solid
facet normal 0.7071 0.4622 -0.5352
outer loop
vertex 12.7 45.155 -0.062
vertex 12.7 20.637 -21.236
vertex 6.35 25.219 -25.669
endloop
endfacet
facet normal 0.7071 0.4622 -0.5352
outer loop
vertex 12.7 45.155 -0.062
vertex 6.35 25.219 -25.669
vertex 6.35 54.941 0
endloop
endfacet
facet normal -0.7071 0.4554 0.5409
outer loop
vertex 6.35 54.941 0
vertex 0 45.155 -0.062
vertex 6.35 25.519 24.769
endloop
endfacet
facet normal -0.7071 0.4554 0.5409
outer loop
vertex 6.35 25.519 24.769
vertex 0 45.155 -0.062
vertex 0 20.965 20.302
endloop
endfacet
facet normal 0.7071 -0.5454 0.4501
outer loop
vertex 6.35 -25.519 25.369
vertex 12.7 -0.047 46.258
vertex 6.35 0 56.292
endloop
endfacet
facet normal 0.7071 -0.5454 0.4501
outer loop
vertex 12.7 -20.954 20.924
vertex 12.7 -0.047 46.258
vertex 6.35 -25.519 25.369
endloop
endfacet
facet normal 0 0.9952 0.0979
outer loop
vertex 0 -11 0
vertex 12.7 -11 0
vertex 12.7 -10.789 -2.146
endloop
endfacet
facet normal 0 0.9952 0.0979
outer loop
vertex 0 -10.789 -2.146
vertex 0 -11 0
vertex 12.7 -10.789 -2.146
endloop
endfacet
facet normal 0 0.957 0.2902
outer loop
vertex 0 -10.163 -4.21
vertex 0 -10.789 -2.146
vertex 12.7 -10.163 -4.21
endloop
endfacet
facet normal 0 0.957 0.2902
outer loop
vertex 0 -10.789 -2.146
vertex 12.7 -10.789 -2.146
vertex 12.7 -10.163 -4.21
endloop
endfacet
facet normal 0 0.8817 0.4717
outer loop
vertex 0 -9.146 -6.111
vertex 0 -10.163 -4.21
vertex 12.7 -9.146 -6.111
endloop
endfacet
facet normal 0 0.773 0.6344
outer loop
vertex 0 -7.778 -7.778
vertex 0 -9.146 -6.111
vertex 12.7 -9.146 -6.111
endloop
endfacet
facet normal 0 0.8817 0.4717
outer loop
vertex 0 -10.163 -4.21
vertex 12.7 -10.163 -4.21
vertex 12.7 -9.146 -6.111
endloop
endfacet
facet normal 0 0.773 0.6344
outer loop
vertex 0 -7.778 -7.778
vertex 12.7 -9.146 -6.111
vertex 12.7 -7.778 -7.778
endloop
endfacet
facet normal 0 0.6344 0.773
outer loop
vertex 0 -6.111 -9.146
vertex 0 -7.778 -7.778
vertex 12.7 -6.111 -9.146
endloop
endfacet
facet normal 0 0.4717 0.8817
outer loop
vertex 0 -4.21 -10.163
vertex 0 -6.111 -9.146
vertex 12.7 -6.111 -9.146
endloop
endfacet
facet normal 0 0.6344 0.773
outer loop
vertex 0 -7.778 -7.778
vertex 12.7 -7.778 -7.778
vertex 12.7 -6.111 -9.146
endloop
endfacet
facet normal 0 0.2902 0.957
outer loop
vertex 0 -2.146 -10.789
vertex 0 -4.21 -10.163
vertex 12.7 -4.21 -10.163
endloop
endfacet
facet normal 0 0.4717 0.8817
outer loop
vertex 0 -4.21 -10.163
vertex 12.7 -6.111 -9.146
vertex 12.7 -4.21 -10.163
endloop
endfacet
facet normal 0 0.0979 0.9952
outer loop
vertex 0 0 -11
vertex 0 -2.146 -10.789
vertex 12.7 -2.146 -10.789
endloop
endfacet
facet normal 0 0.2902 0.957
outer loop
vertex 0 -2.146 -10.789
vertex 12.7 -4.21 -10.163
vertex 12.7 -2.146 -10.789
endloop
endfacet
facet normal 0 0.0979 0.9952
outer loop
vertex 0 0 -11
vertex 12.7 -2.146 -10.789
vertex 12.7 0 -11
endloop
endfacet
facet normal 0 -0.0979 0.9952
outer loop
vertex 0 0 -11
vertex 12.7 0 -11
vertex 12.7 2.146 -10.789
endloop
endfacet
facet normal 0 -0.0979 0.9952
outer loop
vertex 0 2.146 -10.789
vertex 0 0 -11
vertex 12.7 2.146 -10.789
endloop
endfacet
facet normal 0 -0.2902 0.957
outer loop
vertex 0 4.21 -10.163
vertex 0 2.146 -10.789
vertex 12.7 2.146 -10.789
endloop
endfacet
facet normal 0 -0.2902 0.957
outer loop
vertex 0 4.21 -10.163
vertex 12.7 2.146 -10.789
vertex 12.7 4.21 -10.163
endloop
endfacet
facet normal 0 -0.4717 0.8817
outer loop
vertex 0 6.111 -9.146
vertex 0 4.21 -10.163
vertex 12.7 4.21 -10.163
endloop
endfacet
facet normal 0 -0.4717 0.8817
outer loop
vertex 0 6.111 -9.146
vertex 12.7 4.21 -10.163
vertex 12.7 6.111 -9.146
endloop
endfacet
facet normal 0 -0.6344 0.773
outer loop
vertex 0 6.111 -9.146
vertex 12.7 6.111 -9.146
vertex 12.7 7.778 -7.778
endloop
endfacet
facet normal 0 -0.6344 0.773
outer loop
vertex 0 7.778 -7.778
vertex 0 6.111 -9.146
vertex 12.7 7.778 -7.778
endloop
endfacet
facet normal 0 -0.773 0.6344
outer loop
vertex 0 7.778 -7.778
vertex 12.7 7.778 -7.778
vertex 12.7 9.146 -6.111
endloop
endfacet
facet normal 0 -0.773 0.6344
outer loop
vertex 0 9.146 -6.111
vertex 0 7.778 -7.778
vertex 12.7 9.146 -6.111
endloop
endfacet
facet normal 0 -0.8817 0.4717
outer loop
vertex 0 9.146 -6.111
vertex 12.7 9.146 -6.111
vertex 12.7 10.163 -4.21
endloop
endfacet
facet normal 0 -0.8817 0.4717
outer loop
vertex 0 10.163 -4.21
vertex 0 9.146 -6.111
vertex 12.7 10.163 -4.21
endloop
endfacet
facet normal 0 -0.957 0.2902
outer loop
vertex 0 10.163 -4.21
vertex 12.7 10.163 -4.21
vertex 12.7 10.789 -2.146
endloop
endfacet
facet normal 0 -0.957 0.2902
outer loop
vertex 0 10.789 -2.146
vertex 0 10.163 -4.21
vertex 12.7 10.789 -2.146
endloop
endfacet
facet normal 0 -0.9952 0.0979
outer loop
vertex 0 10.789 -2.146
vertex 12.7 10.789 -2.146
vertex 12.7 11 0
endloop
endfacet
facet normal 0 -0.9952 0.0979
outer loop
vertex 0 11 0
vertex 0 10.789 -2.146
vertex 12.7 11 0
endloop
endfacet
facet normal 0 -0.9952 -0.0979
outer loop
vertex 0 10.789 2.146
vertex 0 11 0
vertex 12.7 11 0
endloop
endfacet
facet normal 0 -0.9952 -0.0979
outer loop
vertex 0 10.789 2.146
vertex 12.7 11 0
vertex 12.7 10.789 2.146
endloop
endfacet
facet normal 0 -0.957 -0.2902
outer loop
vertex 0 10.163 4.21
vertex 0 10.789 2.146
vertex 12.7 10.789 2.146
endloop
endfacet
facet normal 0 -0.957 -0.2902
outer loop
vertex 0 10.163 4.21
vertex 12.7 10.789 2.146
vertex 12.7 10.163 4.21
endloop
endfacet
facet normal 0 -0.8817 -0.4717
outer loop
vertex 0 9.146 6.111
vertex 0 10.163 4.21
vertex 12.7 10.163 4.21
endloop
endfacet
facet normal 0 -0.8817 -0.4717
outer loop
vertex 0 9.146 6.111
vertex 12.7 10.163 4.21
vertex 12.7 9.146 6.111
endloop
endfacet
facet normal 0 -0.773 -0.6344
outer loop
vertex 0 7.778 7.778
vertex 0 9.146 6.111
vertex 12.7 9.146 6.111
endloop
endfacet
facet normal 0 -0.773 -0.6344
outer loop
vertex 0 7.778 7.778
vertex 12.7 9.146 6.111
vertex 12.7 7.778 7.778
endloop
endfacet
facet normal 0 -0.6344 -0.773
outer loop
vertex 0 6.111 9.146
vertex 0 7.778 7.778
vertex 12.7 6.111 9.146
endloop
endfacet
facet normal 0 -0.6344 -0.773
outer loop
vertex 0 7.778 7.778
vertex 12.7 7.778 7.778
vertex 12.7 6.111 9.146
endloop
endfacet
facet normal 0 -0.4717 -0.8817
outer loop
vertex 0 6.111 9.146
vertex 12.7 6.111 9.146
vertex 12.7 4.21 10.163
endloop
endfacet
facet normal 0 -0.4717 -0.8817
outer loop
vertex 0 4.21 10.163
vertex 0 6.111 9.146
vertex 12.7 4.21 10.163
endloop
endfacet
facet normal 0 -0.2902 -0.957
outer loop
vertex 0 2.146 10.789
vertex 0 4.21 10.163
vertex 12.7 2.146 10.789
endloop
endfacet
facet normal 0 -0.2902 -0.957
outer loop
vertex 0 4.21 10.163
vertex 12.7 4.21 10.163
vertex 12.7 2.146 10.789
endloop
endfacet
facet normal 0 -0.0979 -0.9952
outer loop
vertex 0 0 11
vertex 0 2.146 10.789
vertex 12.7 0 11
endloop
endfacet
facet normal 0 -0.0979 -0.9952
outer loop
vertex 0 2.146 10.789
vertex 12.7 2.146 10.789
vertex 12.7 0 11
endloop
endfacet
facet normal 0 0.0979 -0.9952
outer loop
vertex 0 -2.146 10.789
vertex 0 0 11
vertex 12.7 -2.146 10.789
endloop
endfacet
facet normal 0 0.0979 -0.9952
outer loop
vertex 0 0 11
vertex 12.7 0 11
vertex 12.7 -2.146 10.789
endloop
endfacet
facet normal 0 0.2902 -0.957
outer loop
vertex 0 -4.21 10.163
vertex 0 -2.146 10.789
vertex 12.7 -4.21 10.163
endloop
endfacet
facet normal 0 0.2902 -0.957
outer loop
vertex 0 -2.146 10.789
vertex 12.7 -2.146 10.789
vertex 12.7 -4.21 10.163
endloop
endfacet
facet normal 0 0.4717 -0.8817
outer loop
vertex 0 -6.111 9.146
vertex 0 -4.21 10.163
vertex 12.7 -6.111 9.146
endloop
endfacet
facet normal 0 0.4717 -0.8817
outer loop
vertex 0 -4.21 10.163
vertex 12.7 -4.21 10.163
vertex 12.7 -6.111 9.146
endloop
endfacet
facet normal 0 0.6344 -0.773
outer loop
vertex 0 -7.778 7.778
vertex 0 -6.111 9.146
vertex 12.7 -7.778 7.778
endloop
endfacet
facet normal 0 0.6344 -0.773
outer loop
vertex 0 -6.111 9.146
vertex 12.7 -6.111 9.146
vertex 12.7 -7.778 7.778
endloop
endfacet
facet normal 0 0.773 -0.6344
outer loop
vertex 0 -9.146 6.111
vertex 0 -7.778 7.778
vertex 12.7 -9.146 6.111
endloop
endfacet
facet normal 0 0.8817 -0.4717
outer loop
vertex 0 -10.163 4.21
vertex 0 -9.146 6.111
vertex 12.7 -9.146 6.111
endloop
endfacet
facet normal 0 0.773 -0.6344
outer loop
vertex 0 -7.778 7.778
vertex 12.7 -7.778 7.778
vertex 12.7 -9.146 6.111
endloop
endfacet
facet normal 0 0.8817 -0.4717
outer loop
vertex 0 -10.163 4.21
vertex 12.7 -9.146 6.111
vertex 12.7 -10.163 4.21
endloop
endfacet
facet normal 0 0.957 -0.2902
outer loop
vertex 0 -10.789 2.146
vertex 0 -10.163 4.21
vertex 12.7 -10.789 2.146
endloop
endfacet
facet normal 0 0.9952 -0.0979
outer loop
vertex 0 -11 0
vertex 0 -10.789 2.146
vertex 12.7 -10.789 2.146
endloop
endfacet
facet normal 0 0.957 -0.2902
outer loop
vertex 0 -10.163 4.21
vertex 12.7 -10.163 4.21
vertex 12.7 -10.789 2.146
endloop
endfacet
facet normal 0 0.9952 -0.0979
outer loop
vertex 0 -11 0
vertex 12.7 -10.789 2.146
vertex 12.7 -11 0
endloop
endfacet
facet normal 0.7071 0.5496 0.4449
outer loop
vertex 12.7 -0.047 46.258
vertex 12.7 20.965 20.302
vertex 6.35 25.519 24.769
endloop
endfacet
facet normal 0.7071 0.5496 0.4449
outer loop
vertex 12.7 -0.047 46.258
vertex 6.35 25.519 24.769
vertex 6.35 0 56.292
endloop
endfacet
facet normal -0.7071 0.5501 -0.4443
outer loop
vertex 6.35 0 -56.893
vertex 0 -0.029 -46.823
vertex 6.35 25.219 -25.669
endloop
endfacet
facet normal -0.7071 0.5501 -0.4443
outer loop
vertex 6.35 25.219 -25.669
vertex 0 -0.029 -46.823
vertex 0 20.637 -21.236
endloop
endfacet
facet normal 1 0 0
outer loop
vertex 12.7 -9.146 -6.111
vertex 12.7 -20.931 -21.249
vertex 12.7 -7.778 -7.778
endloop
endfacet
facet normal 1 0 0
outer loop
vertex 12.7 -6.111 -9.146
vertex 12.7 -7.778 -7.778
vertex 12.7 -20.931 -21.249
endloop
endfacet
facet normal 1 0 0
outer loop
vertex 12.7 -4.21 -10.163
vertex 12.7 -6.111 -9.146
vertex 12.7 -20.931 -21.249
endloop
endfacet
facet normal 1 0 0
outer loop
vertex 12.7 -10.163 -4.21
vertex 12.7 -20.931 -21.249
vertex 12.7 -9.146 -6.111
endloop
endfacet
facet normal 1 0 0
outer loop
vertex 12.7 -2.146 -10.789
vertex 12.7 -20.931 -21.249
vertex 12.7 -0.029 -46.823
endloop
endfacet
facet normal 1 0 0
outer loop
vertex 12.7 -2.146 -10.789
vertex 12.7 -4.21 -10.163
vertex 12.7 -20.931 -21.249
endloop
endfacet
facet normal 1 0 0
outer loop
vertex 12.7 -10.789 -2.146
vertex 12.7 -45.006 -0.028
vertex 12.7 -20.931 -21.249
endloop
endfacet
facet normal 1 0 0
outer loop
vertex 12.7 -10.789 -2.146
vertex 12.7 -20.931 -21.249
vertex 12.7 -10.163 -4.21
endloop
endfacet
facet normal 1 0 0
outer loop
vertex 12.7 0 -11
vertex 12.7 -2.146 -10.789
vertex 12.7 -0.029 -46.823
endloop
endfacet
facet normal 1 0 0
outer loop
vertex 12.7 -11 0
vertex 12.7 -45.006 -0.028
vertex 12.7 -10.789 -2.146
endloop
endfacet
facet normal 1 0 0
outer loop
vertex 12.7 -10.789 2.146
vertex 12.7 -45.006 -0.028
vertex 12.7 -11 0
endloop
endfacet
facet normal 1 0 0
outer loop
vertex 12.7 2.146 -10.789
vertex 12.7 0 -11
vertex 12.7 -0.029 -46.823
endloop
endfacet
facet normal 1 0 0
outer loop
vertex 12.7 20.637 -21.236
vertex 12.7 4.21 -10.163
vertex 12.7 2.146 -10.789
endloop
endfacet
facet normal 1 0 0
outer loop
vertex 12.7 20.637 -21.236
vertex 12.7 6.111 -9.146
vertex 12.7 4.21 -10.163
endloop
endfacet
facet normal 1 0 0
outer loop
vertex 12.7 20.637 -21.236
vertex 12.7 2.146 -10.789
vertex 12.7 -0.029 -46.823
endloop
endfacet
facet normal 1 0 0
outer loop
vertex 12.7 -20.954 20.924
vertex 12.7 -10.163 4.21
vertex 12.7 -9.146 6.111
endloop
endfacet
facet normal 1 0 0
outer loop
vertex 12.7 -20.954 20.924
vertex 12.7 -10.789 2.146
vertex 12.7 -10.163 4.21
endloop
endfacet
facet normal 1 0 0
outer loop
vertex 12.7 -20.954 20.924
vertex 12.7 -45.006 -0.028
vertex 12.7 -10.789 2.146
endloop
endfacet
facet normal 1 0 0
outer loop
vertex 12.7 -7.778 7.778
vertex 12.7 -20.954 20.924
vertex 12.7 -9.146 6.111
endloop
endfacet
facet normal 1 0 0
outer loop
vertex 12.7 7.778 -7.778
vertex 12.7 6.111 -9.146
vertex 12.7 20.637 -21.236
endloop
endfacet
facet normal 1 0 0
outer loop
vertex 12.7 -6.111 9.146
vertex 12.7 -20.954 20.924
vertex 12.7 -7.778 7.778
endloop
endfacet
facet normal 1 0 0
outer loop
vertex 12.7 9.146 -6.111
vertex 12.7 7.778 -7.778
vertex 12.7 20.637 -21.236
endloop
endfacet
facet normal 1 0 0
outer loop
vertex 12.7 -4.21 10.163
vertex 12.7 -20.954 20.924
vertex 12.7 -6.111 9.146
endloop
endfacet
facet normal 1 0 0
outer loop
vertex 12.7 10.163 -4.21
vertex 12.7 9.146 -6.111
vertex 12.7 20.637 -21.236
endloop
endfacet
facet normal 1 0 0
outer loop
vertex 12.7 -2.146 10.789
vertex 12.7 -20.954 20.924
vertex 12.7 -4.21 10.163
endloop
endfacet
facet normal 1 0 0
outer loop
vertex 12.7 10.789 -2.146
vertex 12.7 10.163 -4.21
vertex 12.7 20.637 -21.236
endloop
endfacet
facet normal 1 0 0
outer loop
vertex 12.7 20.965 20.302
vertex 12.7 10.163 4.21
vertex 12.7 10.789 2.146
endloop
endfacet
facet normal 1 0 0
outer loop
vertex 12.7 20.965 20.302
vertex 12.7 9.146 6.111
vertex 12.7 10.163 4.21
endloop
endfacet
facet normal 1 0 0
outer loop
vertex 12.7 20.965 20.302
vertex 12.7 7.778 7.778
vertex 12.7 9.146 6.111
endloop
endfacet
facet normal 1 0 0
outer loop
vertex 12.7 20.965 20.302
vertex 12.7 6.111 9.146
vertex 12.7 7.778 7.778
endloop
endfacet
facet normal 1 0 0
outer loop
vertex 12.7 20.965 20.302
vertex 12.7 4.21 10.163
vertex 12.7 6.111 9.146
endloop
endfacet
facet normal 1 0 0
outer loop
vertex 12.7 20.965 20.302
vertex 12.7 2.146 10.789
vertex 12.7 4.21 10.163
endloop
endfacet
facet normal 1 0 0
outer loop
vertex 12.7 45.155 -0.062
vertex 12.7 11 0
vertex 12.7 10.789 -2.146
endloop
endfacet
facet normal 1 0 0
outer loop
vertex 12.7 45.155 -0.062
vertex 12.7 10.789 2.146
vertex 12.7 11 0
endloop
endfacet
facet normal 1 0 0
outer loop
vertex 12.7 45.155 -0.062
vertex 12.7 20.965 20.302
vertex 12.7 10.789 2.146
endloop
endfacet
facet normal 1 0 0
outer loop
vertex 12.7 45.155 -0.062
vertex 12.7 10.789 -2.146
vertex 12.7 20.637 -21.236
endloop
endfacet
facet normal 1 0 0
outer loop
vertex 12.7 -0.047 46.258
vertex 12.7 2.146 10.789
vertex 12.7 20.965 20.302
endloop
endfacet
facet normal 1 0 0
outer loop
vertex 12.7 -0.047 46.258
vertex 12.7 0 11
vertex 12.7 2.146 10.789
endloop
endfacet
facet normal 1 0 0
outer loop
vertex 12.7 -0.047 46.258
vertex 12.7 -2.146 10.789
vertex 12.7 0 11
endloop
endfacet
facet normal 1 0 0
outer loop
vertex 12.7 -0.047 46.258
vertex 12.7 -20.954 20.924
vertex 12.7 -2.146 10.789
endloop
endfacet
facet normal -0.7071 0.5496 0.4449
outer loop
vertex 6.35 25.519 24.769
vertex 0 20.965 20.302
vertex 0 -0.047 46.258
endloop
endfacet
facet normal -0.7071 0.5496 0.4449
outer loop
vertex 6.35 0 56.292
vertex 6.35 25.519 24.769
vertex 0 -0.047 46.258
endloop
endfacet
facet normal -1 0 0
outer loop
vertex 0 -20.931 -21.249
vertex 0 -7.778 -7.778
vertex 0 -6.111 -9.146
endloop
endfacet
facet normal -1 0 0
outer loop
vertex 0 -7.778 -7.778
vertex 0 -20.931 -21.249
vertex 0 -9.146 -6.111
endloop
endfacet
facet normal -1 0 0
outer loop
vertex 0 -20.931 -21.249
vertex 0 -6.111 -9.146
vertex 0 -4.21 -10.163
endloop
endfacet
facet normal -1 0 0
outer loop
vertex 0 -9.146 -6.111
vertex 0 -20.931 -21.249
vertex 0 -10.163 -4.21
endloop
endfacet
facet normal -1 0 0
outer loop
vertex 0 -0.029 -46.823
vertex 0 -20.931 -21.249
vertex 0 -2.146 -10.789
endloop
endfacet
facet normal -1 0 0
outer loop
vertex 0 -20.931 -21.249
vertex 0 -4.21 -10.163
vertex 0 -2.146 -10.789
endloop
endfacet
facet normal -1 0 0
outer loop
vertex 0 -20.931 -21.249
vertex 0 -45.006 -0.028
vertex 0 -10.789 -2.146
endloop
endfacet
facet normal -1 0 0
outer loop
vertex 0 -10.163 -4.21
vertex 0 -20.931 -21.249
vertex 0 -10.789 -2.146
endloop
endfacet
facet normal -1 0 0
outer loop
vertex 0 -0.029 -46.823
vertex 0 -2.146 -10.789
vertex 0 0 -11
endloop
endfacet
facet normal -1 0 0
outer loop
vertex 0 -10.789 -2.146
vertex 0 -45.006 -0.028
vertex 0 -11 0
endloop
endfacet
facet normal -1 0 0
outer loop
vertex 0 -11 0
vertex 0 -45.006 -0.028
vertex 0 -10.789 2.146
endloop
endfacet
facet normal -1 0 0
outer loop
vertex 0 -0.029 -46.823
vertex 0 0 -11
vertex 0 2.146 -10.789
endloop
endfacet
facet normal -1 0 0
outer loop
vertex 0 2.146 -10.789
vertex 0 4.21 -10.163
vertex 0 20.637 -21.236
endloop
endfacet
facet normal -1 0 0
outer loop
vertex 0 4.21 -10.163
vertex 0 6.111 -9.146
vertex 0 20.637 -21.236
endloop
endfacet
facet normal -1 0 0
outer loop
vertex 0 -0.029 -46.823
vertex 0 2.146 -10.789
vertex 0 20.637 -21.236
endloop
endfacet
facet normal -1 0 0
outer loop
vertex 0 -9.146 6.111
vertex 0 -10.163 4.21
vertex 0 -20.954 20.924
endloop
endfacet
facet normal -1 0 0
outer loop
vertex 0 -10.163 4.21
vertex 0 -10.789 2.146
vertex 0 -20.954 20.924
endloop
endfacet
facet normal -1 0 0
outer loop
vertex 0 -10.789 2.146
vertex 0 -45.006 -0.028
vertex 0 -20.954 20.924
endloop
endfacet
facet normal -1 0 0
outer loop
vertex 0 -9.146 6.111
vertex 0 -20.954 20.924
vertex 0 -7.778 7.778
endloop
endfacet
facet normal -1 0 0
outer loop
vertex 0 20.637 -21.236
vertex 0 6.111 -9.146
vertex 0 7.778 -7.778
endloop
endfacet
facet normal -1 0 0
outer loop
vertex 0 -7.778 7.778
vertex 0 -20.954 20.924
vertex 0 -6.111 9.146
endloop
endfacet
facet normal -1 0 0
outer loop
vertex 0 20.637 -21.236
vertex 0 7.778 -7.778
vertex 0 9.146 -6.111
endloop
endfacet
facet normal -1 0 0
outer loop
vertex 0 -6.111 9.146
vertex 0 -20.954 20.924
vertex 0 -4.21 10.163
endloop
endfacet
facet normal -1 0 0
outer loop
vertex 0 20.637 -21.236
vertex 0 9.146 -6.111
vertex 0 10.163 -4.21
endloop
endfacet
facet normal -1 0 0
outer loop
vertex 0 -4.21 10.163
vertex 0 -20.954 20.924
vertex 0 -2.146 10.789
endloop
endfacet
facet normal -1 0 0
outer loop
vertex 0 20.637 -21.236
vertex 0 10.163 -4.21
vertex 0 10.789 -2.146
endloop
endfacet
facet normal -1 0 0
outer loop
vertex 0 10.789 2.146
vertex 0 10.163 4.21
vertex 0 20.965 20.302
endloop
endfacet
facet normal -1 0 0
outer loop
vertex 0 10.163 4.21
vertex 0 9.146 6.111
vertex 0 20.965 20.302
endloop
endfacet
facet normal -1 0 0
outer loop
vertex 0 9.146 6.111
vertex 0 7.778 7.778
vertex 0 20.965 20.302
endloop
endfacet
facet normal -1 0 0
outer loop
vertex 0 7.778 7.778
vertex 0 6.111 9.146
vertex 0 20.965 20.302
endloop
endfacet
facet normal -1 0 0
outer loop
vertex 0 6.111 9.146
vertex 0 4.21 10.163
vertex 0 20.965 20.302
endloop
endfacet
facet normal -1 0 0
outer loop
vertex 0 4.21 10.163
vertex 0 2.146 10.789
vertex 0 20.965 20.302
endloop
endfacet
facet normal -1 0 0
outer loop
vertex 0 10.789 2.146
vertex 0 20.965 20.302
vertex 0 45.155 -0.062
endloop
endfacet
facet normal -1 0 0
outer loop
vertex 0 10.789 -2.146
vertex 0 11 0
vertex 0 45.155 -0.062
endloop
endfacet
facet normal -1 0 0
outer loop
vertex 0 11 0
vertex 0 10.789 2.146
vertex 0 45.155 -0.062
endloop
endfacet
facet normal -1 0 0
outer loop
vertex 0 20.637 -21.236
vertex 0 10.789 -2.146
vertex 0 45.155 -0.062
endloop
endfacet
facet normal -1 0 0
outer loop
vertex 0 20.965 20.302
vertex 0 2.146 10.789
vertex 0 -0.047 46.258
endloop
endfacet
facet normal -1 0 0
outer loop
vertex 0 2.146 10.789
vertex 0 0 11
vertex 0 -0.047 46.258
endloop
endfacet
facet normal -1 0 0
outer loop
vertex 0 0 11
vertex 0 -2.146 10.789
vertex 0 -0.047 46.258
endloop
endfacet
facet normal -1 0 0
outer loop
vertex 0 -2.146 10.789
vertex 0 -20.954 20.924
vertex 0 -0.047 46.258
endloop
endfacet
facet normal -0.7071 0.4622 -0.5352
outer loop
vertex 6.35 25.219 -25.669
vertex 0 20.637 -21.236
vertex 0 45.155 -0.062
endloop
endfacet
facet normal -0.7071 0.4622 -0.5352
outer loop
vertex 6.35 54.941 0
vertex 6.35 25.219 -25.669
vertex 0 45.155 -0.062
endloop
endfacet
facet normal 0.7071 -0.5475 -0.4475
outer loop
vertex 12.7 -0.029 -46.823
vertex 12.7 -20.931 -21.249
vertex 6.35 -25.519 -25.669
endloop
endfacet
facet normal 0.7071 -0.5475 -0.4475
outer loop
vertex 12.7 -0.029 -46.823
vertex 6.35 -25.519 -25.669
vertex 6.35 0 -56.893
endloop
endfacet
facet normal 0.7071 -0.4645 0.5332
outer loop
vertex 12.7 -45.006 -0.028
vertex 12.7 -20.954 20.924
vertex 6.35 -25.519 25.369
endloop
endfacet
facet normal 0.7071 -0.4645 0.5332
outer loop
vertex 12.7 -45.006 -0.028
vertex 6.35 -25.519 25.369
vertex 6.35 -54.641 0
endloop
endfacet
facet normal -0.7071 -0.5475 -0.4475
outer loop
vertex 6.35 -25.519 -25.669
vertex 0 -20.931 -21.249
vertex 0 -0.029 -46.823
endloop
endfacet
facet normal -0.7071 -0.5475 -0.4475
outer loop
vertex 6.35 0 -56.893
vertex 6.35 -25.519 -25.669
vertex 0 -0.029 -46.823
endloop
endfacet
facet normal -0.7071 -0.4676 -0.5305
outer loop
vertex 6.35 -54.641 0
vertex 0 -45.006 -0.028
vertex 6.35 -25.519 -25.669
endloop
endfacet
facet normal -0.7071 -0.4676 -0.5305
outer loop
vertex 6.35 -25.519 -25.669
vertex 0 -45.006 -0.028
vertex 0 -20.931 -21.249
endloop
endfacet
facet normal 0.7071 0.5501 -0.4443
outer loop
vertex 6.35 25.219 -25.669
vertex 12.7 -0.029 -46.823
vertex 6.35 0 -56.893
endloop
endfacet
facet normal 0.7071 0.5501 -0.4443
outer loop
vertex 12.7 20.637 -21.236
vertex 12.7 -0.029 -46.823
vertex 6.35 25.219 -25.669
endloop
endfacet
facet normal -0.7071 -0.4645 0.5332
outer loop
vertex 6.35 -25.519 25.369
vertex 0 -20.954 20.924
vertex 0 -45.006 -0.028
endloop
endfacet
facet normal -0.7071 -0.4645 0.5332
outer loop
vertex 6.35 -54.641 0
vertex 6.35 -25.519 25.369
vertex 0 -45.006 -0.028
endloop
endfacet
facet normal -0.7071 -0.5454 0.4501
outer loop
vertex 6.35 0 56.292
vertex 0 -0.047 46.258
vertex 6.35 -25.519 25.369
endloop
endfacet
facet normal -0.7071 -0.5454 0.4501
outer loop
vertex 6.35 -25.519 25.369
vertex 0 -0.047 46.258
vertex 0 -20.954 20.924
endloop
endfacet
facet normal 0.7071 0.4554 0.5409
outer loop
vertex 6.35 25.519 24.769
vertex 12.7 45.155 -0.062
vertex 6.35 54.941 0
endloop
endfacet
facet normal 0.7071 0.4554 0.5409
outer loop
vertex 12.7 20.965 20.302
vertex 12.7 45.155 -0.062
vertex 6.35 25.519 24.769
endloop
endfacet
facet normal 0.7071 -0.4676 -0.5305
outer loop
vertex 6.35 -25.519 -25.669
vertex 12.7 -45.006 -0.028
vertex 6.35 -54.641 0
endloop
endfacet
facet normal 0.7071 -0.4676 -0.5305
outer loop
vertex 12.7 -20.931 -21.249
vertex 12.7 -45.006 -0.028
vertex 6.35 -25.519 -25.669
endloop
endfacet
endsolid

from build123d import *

# Parameters (mm, degrees)
F1_DEPTH = 12.7
F2_SIZE  = 6.34999
F4_D     = 22


# Not quite as in the source:
# - a fillet or chamfer is up to 0.001 mm smaller than in the source, because OpenCascade refuses the exact size


with BuildPart() as f1:
    # F0 (on Right) → F1 (new body)
    with BuildSketch(Plane.YZ):
        Polygon((0, 56.2922134995), (-25.5191382021, 25.3690239042), (-54.6409785748, 0), (-25.5191382021, -25.6692506373), (0, -56.8926632404), (25.2189133316, -25.6692506373), (54.9412034452, 0), (25.5191363394, 24.768576026), align=None)
    extrude(amount=F1_DEPTH)

    # F2 (size 6.35 in the source; OpenCascade refuses exactly that, so slightly less here)
    f2_edges = [f1.edges().sort_by_distance(p)[0] for p in [
        (12.7, -40.080058, 12.684512),
        (0, -40.080058, 12.684512),
        (12.7, -40.080058, -12.834625),
        (0, -40.080058, -12.834625),
        (12.7, -12.759569, -41.280957),
        (0, -12.759569, -41.280957),
        (0, 12.609457, -41.280957),
        (12.7, 12.609457, -41.280957),
        (0, 40.080058, -12.834625),
        (12.7, 40.080058, -12.834625),
        (12.7, 40.23017, 12.384288),
        (0, 40.23017, 12.384288),
        (0, 12.759568, 40.530395),
        (12.7, 12.759568, 40.530395),
        (0, -12.759569, 40.830619),
        (12.7, -12.759569, 40.830619),
    ]]
    chamfer(f2_edges, length=F2_SIZE)

    # F4 (through all)
    with Locations(Plane(origin=(0, 0, 0), x_dir=(0, 1, 0), z_dir=(-1, 0, 0))):
        with Locations((0, 0)):
            Hole(F4_D / 2)


solid = f1.part
